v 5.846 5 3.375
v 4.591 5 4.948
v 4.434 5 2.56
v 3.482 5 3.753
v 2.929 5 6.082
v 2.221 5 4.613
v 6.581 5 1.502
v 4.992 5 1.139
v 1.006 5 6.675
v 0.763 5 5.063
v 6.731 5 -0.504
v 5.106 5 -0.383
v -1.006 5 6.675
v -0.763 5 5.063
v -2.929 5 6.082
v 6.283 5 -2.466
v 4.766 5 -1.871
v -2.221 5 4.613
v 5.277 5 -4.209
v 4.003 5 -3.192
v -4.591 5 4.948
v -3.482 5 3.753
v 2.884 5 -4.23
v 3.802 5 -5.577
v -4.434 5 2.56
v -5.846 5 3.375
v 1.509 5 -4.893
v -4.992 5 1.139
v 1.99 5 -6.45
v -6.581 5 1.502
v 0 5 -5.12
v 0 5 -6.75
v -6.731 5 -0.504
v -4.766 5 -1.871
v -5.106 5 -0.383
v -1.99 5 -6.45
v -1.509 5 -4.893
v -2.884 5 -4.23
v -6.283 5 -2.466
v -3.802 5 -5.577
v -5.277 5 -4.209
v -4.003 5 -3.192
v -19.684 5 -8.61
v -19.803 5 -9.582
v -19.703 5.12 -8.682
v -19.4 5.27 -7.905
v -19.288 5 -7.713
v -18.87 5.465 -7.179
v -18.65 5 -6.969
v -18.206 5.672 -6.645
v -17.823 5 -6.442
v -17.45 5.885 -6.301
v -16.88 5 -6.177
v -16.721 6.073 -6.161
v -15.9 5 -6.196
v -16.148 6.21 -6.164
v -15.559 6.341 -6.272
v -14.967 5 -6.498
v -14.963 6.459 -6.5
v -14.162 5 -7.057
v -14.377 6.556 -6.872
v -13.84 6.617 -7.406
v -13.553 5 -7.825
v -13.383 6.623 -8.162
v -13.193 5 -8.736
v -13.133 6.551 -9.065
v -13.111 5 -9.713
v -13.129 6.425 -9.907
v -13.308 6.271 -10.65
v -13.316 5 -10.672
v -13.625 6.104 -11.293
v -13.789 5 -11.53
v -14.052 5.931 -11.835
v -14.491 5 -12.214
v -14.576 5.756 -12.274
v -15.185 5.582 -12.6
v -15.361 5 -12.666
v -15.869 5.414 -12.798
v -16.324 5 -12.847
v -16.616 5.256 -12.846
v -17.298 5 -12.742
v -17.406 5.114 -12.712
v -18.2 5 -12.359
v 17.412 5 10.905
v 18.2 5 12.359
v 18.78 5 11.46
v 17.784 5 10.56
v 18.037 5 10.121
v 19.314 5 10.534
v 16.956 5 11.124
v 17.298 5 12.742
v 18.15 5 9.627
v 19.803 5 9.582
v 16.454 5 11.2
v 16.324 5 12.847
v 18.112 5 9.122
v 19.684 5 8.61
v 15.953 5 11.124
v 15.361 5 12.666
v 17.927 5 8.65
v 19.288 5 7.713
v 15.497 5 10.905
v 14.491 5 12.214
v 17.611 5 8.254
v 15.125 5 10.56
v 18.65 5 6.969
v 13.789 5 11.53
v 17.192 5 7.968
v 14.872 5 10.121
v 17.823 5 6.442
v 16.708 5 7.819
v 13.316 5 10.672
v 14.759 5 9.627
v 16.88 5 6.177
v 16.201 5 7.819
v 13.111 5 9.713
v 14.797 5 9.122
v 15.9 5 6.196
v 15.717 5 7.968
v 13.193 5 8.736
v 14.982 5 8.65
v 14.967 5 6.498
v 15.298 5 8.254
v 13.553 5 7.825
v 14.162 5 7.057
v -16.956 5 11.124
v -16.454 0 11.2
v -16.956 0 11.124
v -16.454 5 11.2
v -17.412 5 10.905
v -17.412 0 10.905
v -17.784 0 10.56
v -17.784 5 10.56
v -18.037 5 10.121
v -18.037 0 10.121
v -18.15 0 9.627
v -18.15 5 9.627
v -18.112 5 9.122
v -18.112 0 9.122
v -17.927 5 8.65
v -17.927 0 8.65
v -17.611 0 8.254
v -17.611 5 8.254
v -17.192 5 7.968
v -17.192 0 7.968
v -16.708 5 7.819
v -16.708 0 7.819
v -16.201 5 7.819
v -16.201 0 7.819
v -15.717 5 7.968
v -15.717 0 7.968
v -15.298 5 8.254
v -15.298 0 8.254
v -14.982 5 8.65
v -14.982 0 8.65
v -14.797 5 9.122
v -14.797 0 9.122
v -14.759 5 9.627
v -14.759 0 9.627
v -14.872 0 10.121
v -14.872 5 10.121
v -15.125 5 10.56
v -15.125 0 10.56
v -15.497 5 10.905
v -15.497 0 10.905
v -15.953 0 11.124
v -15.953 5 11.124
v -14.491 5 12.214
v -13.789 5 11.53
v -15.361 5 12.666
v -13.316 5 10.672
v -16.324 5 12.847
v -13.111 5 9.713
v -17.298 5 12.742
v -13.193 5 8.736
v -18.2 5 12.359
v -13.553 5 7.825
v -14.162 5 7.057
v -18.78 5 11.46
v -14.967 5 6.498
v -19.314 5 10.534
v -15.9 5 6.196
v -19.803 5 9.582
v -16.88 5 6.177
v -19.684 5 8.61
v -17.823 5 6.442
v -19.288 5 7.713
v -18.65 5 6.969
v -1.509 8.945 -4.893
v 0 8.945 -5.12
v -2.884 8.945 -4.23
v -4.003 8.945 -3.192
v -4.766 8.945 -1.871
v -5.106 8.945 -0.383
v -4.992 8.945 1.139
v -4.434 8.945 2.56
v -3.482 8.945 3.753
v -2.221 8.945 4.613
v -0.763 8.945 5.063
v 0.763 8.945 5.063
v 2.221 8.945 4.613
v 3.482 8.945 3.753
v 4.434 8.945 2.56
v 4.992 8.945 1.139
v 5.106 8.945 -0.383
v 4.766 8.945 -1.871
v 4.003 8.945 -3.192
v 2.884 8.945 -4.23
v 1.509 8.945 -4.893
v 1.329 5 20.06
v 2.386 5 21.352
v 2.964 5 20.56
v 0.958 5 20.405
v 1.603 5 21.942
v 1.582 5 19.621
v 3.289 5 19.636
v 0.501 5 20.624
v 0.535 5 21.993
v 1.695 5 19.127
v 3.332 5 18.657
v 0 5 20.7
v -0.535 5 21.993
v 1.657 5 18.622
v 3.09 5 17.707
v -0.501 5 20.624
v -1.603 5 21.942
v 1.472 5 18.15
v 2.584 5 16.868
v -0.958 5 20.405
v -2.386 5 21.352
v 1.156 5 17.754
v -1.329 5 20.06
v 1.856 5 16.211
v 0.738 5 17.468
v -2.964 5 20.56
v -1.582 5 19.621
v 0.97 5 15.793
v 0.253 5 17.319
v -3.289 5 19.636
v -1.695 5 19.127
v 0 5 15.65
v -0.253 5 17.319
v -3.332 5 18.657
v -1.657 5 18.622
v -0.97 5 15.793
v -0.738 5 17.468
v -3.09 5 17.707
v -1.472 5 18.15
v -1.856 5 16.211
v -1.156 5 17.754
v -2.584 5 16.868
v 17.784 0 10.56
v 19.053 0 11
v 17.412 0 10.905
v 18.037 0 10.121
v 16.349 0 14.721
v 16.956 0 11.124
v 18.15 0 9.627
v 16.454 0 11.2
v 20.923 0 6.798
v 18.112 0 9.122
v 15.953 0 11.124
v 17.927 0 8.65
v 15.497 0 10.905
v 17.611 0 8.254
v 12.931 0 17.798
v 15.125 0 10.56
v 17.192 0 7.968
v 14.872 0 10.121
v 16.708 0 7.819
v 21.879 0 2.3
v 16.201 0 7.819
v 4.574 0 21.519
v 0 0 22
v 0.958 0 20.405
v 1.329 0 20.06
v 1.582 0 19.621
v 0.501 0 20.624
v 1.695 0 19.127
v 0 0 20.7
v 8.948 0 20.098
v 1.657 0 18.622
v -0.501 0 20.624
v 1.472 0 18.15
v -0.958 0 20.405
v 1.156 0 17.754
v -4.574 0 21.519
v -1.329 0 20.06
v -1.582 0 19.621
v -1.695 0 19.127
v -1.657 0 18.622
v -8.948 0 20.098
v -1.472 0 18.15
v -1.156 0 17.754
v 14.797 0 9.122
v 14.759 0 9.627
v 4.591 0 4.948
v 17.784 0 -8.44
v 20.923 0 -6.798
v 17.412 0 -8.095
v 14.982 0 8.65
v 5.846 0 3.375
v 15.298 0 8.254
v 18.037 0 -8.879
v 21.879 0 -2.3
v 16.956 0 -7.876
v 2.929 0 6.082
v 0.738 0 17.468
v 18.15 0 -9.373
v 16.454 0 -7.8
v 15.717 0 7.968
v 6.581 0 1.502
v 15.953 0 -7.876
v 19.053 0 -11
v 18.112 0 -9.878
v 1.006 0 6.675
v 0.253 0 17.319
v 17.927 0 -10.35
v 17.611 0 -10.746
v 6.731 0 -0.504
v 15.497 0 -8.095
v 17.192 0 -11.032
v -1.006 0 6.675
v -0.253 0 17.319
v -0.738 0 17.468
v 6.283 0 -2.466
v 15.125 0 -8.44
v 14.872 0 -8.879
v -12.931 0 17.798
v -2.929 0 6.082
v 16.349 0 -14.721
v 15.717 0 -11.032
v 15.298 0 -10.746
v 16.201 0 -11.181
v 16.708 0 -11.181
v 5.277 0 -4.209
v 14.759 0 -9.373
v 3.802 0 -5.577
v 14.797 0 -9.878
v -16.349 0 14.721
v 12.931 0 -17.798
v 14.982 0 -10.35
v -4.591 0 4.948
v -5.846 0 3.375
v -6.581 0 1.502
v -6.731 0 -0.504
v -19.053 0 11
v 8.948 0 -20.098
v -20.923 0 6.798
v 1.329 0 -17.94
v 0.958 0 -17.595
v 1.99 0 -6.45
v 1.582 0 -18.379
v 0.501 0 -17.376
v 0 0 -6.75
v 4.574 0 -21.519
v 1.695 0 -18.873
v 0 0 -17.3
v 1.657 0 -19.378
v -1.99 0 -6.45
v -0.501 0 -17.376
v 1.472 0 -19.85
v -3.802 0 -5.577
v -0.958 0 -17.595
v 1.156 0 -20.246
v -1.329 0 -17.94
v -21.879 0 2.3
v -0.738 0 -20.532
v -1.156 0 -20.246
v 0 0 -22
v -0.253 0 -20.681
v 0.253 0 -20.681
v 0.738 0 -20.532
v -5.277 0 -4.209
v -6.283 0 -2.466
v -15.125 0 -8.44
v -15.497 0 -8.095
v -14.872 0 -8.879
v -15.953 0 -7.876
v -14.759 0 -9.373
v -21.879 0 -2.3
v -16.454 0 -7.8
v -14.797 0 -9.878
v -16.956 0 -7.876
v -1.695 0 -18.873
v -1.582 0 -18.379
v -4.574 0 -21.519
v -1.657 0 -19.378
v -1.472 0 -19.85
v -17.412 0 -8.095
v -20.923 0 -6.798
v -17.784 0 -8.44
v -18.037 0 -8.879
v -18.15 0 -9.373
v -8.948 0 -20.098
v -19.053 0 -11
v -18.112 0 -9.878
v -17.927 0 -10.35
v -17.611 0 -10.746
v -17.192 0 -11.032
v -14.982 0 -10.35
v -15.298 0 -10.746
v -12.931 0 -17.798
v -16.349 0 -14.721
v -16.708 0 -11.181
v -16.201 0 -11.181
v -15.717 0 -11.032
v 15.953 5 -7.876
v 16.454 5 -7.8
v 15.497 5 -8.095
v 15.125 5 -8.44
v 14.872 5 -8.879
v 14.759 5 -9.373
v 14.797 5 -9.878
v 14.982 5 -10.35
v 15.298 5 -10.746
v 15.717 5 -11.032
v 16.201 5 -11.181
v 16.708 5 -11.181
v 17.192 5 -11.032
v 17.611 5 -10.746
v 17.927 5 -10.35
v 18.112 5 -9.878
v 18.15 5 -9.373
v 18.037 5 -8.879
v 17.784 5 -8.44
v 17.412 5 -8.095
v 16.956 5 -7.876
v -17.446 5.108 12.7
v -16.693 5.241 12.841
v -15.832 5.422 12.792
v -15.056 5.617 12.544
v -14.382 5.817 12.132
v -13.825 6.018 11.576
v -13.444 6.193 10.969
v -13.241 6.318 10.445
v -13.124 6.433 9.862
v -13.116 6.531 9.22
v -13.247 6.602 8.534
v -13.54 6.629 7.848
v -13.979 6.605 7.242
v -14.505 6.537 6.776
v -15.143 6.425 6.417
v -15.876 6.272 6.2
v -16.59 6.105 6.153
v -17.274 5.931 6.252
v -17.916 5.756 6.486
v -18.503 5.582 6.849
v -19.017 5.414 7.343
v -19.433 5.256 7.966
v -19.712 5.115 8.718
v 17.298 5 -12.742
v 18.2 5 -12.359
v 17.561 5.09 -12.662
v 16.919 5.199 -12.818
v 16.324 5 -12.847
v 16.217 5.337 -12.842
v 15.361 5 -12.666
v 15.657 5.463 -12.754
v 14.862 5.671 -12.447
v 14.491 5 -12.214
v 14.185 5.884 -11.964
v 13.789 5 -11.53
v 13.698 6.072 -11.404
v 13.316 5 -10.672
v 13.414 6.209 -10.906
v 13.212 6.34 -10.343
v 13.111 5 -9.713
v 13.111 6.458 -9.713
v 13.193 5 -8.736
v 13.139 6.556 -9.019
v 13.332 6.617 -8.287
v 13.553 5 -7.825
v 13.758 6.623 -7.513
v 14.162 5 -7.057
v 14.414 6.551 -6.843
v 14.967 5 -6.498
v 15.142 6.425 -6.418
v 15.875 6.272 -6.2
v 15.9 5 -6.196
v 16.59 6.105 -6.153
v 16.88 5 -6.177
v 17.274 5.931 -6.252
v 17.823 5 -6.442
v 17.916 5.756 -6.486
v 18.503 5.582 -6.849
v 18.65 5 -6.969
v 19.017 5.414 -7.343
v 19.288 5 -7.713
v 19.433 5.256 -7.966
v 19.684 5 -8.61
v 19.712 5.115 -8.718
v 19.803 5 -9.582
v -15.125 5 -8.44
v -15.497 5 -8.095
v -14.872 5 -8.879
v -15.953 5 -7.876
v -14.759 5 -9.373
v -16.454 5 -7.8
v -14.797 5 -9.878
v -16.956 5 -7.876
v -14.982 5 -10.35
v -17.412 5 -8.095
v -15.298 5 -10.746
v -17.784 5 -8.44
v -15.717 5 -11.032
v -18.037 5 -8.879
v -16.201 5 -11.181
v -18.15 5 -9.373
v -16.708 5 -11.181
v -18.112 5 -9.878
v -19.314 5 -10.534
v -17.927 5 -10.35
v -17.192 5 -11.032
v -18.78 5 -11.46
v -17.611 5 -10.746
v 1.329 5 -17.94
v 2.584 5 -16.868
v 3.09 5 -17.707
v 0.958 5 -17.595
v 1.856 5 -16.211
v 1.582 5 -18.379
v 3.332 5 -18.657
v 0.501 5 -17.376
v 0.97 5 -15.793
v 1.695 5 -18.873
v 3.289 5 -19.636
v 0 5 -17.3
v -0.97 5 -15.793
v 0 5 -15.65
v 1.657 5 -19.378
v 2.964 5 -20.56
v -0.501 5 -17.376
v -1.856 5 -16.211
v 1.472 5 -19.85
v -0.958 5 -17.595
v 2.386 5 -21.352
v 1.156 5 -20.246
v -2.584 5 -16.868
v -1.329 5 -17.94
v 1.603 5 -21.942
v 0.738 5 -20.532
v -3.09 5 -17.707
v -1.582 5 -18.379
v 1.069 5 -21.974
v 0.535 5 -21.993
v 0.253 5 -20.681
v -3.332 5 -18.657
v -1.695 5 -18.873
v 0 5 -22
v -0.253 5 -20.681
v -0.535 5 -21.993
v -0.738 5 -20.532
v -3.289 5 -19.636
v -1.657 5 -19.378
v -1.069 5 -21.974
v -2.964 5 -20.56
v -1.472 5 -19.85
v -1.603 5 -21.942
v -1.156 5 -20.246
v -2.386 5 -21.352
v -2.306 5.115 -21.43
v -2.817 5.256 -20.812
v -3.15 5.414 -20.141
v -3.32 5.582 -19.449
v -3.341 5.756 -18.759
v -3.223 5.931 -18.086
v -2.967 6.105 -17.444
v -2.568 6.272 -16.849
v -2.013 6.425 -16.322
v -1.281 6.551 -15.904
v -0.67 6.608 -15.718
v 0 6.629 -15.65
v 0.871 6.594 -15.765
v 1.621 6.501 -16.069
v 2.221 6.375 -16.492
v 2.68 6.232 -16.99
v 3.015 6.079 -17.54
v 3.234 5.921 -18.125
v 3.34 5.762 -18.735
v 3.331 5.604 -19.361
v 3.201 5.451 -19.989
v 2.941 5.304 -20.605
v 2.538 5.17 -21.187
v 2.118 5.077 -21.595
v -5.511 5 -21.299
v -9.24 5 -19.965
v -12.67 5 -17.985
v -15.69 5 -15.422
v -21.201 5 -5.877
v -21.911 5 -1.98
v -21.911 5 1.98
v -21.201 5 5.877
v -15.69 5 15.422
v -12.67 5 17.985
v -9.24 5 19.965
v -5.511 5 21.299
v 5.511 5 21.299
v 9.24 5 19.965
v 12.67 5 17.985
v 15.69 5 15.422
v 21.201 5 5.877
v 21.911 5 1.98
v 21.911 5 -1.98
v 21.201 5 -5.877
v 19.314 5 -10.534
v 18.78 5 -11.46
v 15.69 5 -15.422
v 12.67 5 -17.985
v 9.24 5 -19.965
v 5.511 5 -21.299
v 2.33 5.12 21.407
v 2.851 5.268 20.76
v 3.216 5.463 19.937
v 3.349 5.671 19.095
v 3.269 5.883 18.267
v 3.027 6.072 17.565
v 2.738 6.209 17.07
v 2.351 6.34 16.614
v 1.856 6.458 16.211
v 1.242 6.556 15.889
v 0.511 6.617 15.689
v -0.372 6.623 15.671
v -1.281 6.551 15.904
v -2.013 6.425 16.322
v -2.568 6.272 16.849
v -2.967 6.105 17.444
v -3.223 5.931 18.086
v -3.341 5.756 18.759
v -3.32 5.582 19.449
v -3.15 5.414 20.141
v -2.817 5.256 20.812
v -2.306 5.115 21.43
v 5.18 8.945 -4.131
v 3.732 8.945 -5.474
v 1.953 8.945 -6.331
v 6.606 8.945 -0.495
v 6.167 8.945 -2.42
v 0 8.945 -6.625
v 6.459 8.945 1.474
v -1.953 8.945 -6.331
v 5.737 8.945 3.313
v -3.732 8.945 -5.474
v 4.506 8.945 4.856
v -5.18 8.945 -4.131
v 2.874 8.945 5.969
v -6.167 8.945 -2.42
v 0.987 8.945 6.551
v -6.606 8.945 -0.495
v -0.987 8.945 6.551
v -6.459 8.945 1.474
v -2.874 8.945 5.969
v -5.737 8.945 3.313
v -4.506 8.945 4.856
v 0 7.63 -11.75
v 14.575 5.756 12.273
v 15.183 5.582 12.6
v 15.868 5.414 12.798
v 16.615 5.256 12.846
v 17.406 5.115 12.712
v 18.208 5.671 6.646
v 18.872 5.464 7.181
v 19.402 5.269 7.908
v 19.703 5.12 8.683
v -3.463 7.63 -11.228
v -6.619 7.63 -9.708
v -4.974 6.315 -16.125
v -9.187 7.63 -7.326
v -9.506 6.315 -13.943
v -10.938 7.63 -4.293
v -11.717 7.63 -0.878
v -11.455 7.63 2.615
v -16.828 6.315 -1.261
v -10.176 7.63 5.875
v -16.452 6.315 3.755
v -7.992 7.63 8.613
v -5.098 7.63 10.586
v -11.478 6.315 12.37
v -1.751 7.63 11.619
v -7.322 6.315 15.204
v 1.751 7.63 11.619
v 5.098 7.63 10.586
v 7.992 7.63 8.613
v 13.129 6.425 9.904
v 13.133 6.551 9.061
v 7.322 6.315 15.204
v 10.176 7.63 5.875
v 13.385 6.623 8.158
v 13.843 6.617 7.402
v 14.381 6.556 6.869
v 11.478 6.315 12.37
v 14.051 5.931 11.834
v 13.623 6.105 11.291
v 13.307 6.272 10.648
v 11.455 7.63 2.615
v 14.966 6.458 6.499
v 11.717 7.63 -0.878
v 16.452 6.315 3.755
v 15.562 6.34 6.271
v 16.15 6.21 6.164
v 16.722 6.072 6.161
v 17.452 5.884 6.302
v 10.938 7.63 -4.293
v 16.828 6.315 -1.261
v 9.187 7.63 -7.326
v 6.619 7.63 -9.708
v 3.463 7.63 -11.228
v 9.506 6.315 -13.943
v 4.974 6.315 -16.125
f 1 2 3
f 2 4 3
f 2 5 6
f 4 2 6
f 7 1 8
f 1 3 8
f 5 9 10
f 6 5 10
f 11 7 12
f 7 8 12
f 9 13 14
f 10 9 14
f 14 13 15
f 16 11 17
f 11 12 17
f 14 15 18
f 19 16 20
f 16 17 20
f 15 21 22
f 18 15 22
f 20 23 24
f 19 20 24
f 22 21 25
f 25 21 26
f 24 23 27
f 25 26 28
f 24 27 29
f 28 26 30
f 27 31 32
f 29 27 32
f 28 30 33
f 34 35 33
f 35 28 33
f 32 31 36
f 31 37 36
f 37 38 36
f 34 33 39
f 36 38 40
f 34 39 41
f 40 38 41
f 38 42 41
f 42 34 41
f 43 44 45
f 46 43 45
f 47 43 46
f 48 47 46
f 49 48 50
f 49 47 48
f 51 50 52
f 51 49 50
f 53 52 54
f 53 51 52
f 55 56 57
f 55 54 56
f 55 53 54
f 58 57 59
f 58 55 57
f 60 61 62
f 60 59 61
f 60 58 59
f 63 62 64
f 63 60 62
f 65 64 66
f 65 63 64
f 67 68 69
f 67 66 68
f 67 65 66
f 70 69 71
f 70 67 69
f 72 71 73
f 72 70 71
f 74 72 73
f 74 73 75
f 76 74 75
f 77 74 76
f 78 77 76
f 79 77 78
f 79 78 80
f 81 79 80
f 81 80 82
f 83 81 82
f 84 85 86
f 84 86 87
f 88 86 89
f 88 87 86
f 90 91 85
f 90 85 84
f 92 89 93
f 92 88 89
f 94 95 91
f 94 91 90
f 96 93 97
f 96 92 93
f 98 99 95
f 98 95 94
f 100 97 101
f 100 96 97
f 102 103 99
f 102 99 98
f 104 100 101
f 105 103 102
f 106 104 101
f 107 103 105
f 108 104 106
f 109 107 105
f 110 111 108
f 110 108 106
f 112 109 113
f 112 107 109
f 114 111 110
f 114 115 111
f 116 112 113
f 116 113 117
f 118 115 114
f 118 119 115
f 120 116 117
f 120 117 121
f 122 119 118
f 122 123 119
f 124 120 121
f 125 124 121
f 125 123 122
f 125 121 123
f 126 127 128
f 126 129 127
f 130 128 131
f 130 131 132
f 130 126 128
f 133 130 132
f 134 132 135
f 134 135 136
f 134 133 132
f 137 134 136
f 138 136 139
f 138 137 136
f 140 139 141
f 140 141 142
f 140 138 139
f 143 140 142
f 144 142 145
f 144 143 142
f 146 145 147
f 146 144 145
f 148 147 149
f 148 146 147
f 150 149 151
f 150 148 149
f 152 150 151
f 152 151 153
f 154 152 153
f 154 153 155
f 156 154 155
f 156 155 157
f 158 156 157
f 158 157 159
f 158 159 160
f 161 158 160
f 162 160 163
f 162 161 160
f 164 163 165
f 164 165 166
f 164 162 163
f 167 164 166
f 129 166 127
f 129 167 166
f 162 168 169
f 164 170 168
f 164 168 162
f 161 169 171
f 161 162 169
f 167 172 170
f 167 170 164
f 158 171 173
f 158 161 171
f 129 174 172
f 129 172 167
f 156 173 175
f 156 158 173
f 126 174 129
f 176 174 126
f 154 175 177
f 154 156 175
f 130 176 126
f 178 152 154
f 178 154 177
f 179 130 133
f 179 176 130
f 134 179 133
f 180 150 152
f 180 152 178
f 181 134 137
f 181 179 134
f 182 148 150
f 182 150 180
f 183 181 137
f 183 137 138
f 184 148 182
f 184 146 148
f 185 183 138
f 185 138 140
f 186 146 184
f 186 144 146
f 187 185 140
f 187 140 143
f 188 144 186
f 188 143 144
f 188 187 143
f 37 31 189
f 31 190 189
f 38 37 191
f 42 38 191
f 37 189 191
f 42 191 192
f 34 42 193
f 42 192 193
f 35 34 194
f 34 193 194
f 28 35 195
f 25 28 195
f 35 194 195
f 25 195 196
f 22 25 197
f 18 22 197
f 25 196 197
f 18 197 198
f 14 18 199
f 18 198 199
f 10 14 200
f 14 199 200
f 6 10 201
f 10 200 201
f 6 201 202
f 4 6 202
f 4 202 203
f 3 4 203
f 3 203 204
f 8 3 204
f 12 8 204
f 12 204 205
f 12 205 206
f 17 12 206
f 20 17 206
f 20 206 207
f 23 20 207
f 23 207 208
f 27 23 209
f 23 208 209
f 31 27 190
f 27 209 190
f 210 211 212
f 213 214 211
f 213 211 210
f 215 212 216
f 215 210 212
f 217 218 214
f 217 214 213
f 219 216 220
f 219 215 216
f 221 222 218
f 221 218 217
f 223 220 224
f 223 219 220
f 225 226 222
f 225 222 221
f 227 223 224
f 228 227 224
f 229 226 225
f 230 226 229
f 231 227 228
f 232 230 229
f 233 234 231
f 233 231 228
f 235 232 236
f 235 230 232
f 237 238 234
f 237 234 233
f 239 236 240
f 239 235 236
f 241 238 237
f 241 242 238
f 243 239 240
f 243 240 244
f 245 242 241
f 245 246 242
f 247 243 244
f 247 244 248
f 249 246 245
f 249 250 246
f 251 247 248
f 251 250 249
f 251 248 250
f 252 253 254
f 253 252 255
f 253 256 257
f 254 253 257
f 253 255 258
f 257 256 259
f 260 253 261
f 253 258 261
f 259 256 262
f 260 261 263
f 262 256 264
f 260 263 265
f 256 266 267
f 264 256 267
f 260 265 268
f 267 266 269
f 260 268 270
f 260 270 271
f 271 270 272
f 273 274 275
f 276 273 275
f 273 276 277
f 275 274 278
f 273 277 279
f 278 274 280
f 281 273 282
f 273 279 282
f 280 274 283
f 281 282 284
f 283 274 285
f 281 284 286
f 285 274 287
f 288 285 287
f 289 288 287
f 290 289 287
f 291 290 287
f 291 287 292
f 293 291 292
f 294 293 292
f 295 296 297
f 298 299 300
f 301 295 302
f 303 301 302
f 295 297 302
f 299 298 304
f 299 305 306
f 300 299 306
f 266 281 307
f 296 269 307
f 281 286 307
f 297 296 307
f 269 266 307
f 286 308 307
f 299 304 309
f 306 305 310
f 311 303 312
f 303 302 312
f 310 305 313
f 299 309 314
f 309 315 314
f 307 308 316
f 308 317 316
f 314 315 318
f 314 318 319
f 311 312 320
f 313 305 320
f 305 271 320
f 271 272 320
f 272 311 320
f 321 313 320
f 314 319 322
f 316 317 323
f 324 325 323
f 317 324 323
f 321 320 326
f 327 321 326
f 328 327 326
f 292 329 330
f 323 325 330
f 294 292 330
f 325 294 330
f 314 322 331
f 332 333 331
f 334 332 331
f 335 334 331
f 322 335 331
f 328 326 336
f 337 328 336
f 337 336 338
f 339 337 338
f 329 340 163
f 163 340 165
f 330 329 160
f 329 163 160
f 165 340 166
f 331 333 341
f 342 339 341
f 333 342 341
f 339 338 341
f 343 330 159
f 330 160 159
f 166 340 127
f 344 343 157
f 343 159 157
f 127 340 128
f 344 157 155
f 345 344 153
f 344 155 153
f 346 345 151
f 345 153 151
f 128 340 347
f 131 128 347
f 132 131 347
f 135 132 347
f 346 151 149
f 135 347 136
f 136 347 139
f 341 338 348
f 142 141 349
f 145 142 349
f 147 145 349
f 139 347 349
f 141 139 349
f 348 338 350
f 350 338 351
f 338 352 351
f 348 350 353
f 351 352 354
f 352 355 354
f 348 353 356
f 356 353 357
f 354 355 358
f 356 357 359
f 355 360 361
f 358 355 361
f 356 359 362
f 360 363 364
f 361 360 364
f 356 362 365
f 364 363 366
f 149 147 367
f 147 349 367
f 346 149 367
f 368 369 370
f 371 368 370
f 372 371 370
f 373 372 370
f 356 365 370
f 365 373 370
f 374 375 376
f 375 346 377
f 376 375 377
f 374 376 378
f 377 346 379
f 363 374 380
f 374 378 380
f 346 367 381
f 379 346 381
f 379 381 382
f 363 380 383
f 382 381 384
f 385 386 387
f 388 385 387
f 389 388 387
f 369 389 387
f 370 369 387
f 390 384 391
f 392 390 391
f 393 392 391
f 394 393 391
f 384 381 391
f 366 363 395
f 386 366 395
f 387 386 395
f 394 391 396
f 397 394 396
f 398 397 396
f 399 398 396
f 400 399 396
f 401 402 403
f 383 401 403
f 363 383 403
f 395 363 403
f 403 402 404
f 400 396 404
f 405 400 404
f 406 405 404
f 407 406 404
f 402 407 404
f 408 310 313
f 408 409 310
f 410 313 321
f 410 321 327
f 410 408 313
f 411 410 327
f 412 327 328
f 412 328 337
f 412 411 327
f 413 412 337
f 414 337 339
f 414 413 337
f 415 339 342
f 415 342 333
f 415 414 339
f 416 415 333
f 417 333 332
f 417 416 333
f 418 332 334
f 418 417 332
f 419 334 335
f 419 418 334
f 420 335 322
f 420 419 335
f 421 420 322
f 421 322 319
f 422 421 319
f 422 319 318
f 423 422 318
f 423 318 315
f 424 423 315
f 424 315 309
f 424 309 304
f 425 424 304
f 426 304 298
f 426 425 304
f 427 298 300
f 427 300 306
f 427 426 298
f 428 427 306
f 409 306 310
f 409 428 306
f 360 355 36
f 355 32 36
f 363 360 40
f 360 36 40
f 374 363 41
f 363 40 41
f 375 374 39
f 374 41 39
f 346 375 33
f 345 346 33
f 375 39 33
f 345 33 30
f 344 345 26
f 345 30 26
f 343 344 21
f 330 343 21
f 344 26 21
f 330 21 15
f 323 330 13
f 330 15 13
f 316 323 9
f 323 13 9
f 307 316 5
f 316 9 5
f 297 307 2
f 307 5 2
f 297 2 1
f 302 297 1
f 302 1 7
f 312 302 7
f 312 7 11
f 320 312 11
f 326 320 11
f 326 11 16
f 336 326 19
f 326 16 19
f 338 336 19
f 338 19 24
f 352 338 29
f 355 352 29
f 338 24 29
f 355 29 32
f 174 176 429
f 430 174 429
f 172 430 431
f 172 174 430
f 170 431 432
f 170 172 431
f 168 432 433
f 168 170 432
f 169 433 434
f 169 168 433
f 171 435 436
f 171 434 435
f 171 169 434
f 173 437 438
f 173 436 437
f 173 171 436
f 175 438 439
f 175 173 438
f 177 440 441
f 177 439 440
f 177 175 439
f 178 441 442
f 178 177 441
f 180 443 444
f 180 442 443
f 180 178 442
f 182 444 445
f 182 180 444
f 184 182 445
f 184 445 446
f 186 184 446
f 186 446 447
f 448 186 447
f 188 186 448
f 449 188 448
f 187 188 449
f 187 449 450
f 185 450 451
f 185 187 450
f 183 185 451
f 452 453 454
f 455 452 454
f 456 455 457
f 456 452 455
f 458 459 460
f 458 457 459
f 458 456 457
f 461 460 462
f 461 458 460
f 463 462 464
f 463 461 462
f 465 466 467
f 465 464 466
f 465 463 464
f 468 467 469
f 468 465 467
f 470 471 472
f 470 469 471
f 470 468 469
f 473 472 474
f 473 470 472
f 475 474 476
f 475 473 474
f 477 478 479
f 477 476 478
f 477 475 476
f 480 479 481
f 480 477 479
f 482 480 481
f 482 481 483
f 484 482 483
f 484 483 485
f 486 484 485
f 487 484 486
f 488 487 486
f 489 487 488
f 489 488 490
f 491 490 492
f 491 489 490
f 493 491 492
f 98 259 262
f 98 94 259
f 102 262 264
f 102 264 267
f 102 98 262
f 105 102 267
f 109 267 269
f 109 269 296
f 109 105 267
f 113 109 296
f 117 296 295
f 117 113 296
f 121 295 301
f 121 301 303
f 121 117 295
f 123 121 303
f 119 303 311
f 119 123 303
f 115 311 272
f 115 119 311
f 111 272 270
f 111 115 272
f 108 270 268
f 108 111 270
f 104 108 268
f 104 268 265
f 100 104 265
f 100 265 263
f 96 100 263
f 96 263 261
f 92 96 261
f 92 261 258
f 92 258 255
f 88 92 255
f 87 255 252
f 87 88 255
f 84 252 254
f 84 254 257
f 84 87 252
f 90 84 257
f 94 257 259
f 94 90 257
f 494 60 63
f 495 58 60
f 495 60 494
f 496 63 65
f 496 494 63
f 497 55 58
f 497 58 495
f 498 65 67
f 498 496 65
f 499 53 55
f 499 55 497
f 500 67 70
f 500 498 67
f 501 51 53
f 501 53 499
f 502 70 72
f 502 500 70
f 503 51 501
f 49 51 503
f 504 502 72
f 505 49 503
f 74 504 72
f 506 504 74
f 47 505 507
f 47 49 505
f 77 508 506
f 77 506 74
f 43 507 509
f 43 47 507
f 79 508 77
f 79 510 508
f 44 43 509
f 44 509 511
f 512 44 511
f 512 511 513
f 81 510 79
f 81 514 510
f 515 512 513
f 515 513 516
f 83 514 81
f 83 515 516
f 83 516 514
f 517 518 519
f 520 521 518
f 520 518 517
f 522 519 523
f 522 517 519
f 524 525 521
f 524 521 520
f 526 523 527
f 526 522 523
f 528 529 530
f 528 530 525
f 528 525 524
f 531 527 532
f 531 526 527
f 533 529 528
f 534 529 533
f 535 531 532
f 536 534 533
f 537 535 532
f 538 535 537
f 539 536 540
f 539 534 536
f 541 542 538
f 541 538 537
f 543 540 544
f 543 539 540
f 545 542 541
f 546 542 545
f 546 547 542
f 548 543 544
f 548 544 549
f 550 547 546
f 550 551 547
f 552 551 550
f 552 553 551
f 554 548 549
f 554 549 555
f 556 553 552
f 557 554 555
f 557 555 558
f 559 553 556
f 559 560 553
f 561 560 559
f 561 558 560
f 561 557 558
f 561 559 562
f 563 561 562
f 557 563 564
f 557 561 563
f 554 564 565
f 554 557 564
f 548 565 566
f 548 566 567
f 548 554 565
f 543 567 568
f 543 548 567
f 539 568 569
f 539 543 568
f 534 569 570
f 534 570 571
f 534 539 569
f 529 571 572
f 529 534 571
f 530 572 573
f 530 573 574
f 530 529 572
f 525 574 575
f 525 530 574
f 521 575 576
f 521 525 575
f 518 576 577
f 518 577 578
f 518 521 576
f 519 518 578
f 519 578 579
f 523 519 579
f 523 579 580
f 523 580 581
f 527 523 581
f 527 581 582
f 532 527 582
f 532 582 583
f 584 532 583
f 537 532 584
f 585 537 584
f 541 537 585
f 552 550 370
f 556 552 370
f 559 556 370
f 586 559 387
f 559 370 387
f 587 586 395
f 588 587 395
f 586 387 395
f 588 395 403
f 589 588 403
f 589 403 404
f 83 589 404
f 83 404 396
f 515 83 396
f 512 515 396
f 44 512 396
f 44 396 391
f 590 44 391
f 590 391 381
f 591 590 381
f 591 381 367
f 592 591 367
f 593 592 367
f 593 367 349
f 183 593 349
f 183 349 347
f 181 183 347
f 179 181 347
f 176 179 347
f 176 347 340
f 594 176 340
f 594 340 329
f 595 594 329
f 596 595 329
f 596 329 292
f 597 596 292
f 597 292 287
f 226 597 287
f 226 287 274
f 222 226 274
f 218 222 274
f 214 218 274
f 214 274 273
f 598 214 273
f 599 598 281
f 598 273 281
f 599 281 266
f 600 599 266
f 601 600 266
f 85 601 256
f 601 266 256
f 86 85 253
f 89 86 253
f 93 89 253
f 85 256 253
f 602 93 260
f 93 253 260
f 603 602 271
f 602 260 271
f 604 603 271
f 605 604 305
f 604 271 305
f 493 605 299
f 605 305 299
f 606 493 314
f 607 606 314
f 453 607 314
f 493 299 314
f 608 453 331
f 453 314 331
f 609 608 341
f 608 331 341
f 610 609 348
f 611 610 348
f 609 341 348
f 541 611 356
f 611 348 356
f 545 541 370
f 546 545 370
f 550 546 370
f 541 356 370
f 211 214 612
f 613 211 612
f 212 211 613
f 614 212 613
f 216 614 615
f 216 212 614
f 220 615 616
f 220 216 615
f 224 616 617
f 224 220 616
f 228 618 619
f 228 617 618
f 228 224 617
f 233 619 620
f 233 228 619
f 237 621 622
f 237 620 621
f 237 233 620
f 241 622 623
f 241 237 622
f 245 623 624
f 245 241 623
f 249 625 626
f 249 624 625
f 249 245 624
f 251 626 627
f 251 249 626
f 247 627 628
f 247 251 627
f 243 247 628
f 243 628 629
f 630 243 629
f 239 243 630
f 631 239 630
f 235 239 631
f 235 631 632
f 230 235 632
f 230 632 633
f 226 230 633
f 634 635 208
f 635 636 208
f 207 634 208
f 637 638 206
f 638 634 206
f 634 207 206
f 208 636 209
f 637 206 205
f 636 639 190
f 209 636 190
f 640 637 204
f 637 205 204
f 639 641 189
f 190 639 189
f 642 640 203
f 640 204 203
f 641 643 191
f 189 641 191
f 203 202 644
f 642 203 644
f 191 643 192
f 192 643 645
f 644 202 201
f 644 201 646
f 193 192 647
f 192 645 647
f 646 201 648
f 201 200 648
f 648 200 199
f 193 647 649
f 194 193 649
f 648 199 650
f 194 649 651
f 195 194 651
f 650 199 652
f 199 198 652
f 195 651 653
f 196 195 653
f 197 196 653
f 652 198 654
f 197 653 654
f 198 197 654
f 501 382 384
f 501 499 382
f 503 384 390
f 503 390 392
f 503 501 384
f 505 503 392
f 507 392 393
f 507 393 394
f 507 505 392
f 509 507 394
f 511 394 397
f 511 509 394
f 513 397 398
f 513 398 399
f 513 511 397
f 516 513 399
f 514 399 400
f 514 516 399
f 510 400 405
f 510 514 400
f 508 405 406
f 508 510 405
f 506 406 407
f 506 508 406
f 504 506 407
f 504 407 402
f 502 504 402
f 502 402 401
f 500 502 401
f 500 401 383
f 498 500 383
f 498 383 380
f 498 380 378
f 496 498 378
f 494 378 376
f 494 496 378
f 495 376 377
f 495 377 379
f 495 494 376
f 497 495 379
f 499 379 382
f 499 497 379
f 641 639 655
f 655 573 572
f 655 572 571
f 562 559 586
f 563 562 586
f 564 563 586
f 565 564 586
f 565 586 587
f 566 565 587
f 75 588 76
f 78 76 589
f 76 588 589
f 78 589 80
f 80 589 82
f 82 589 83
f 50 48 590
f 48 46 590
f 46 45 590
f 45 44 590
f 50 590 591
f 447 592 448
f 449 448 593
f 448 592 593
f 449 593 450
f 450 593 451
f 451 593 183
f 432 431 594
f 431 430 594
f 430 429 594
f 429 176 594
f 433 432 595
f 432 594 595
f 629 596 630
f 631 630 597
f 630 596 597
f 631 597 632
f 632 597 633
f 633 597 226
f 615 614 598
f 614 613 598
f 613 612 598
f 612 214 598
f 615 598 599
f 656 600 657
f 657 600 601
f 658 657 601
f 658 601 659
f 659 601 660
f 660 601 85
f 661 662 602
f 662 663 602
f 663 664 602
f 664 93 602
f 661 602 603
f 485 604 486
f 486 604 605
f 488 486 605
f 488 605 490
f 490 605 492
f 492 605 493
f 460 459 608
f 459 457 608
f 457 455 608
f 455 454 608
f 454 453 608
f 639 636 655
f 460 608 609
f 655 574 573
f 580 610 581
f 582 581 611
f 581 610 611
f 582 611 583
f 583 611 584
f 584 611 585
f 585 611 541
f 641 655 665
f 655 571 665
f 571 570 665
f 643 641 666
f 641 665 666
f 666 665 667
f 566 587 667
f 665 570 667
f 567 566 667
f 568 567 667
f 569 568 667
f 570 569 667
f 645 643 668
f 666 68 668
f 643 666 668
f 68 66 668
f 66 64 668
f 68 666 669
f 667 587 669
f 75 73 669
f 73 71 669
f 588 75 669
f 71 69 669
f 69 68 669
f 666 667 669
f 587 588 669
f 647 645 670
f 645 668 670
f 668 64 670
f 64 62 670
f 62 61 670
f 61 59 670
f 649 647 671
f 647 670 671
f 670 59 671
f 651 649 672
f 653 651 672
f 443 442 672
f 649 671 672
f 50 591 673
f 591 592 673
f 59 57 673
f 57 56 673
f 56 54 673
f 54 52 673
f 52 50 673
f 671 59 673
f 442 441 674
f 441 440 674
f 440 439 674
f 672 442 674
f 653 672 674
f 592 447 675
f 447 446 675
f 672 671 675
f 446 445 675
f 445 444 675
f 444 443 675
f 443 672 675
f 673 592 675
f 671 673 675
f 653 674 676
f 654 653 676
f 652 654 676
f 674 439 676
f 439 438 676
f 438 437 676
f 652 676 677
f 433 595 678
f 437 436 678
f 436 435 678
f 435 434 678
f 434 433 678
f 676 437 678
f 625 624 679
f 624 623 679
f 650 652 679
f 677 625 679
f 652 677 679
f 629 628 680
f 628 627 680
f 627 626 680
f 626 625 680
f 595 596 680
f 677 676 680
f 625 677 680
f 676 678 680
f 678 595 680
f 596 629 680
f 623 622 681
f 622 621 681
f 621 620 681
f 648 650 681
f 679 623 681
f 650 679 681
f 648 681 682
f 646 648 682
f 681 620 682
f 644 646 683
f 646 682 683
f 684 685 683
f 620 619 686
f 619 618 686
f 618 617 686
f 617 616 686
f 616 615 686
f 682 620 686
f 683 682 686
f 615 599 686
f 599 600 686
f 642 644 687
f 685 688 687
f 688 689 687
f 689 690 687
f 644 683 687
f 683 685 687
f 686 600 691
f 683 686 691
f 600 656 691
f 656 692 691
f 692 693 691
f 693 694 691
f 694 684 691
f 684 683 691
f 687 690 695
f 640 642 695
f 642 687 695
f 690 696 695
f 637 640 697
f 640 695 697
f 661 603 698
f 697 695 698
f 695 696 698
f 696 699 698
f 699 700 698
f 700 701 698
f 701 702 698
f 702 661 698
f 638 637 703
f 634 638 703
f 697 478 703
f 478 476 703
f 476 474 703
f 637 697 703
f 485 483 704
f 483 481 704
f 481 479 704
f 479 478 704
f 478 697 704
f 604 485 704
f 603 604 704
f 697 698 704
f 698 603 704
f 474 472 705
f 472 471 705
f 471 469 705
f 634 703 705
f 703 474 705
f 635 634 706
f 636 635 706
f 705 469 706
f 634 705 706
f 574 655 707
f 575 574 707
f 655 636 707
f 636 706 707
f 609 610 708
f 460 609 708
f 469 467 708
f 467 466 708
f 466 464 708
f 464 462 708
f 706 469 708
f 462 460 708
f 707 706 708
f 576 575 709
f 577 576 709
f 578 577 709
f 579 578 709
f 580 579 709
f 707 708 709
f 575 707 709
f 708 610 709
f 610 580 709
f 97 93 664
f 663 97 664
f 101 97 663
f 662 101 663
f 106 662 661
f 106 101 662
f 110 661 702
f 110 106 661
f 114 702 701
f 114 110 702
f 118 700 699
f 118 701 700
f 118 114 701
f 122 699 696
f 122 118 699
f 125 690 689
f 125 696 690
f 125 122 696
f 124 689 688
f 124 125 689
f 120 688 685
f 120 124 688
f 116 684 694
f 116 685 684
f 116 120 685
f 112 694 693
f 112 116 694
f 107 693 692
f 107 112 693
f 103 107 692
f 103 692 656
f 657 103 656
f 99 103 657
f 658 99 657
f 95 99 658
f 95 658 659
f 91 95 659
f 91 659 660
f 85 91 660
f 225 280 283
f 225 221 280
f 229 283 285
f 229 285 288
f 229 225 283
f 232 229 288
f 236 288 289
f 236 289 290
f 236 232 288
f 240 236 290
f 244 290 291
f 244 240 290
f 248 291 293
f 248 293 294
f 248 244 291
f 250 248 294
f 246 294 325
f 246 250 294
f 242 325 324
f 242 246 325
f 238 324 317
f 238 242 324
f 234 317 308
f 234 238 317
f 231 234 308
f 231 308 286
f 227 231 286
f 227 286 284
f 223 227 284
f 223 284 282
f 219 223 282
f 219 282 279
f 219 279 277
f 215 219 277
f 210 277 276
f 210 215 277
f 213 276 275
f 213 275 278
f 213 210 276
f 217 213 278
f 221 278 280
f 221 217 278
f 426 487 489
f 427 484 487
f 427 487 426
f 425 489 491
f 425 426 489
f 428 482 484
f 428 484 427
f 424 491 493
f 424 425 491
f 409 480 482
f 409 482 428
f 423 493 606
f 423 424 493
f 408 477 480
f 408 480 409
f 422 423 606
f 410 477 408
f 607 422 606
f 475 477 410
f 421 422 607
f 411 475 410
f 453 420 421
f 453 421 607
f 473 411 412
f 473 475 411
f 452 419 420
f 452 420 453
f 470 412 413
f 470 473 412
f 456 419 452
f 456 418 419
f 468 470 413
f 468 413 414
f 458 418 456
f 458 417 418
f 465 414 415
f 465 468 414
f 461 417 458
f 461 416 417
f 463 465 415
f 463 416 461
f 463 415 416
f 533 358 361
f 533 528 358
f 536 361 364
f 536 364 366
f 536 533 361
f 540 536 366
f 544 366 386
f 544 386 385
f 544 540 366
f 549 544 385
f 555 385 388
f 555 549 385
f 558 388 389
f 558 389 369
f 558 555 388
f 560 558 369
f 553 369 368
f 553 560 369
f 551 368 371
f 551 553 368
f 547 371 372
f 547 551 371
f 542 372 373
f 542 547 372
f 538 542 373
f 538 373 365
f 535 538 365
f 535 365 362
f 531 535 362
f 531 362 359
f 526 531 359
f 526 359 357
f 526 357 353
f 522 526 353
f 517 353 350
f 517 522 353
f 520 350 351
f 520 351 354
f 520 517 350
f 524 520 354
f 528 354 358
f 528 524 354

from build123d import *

# Parameters (mm, degrees)
M3_CLEARANCE_HOLE1_AT_2_COUNT  = 2
M3_CLEARANCE_HOLE1_AT_2_PITCH  = 19
M3_CLEARANCE_HOLE1_AT_3_COUNT  = 2
M3_CLEARANCE_HOLE1_AT_3_PITCH  = 32.908965344
M3_CLEARANCE_HOLE1_AT_4_COUNT  = 2
M3_CLEARANCE_HOLE1_AT_4_PITCH  = 38
M3_CLEARANCE_HOLE1_AT_5_COUNT  = 2
M3_CLEARANCE_HOLE1_AT_5_PITCH  = 32.908965344
M3_CLEARANCE_HOLE1_AT_6_COUNT  = 2
M3_CLEARANCE_HOLE1_AT_6_PITCH  = 19
M3_CLEARANCE_HOLE1_AT_7_COUNT  = 2
M3_CLEARANCE_HOLE1_AT_7_PITCH  = 19
CBORE_FOR_M3_SBHCS7_AT_2_COUNT = 2
CBORE_FOR_M3_SBHCS7_AT_2_PITCH = 19
CBORE_FOR_M3_SBHCS7_AT_3_COUNT = 2
CBORE_FOR_M3_SBHCS7_AT_3_PITCH = 32.908965344
CBORE_FOR_M3_SBHCS7_AT_4_COUNT = 2
CBORE_FOR_M3_SBHCS7_AT_4_PITCH = 38
CBORE_FOR_M3_SBHCS7_AT_5_COUNT = 2
CBORE_FOR_M3_SBHCS7_AT_5_PITCH = 32.908965344
CBORE_FOR_M3_SBHCS7_AT_6_COUNT = 2
CBORE_FOR_M3_SBHCS7_AT_6_PITCH = 19


with BuildPart() as part:
    # Sketch1 → Revolve1 (revolve)
    with BuildSketch(Plane.XY, mode=Mode.PRIVATE) as revolve1_sk:
        Polygon((5.12, 5), (5.12, 8.9453), (6.625, 8.9453), (22, 5), (22, 0), (6.75, 0), (6.75, 5), align=None)
    revolve(revolve1_sk.sketch.rotate(Axis((0, 0, 0), (0, 1, 0)), 90), axis=Axis((0, 0, 0), (0, 1, 0)))

    # Sketch3 → M3 Clearance Hole1 (revolve, cut)
    with BuildSketch(Plane(origin=(0, 5, -19), x_dir=(0, 0, 1), z_dir=(1, 0, 0))):
        Polygon((0, 0), (0, 6.021463052), (1.7, 5), (1.7, 0), align=None)
    m3_clearance_hole1 = revolve(axis=Axis((0, 11.35, -19), (0, -1, 0)), mode=Mode.SUBTRACT)

    # M3 Clearance Hole1 at 2: M3 Clearance Hole1 ×2
    with Locations(*[Vector(0.8660254037844387, 0, 0.49999999999999994) * (i * M3_CLEARANCE_HOLE1_AT_2_PITCH) for i in range(1, M3_CLEARANCE_HOLE1_AT_2_COUNT)]):
        add(m3_clearance_hole1, mode=Mode.SUBTRACT)

    # M3 Clearance Hole1 at 3: M3 Clearance Hole1 ×2
    with Locations(*[Vector(0.5000000000000001, 0, 0.8660254037844386) * (i * M3_CLEARANCE_HOLE1_AT_3_PITCH) for i in range(1, M3_CLEARANCE_HOLE1_AT_3_COUNT)]):
        add(m3_clearance_hole1, mode=Mode.SUBTRACT)

    # M3 Clearance Hole1 at 4: M3 Clearance Hole1 ×2
    with Locations(*[(0, 0, i * M3_CLEARANCE_HOLE1_AT_4_PITCH) for i in range(1, M3_CLEARANCE_HOLE1_AT_4_COUNT)]):
        add(m3_clearance_hole1, mode=Mode.SUBTRACT)

    # M3 Clearance Hole1 at 5: M3 Clearance Hole1 ×2
    with Locations(*[Vector(-0.49999999999999983, 0, 0.8660254037844388) * (i * M3_CLEARANCE_HOLE1_AT_5_PITCH) for i in range(1, M3_CLEARANCE_HOLE1_AT_5_COUNT)]):
        add(m3_clearance_hole1, mode=Mode.SUBTRACT)

    # M3 Clearance Hole1 at 6: M3 Clearance Hole1 ×2
    with Locations(*[Vector(-0.8660254037844387, 0, 0.4999999999999999) * (i * M3_CLEARANCE_HOLE1_AT_6_PITCH) for i in range(1, M3_CLEARANCE_HOLE1_AT_6_COUNT)]):
        add(m3_clearance_hole1, mode=Mode.SUBTRACT)

    # M3 Clearance Hole1 at 7: M3 Clearance Hole1 ×2
    with Locations(*[(0, 0, i * M3_CLEARANCE_HOLE1_AT_7_PITCH) for i in range(1, M3_CLEARANCE_HOLE1_AT_7_COUNT)]):
        add(m3_clearance_hole1, mode=Mode.SUBTRACT)

    # Sketch5 → CBORE for M3 SBHCS7 (revolve, cut)
    with BuildSketch(Plane(origin=(-16.454482672, 5, -9.5), x_dir=(0, 0, -1), z_dir=(1, 0, 0))):
        Polygon((0, 0), (0, 4.966763052), (1.7, 3.9453), (1.7, 1.65), (3.35, 1.65), (3.35, 0), align=None)
    cbore_for_m3_sbhcs7 = revolve(axis=Axis((-16.454482672, -1.35, -9.5), (0, 1, 0)), mode=Mode.SUBTRACT)

    # CBORE for M3 SBHCS7 at 2: CBORE for M3 SBHCS7 ×2
    with Locations(*[Vector(0.8660254037844387, 0, -0.4999999999999999) * (i * CBORE_FOR_M3_SBHCS7_AT_2_PITCH) for i in range(1, CBORE_FOR_M3_SBHCS7_AT_2_COUNT)]):
        add(cbore_for_m3_sbhcs7, mode=Mode.SUBTRACT)

    # CBORE for M3 SBHCS7 at 3: CBORE for M3 SBHCS7 ×2
    with Locations(*[(i * CBORE_FOR_M3_SBHCS7_AT_3_PITCH, 0, 0) for i in range(1, CBORE_FOR_M3_SBHCS7_AT_3_COUNT)]):
        add(cbore_for_m3_sbhcs7, mode=Mode.SUBTRACT)

    # CBORE for M3 SBHCS7 at 4: CBORE for M3 SBHCS7 ×2
    with Locations(*[Vector(0.8660254037844387, 0, 0.49999999999999994) * (i * CBORE_FOR_M3_SBHCS7_AT_4_PITCH) for i in range(1, CBORE_FOR_M3_SBHCS7_AT_4_COUNT)]):
        add(cbore_for_m3_sbhcs7, mode=Mode.SUBTRACT)

    # CBORE for M3 SBHCS7 at 5: CBORE for M3 SBHCS7 ×2
    with Locations(*[Vector(0.49999999999999994, 0, 0.8660254037844387) * (i * CBORE_FOR_M3_SBHCS7_AT_5_PITCH) for i in range(1, CBORE_FOR_M3_SBHCS7_AT_5_COUNT)]):
        add(cbore_for_m3_sbhcs7, mode=Mode.SUBTRACT)

    # CBORE for M3 SBHCS7 at 6: CBORE for M3 SBHCS7 ×2
    with Locations(*[(0, 0, i * CBORE_FOR_M3_SBHCS7_AT_6_PITCH) for i in range(1, CBORE_FOR_M3_SBHCS7_AT_6_COUNT)]):
        add(cbore_for_m3_sbhcs7, mode=Mode.SUBTRACT)


solid = part.part
